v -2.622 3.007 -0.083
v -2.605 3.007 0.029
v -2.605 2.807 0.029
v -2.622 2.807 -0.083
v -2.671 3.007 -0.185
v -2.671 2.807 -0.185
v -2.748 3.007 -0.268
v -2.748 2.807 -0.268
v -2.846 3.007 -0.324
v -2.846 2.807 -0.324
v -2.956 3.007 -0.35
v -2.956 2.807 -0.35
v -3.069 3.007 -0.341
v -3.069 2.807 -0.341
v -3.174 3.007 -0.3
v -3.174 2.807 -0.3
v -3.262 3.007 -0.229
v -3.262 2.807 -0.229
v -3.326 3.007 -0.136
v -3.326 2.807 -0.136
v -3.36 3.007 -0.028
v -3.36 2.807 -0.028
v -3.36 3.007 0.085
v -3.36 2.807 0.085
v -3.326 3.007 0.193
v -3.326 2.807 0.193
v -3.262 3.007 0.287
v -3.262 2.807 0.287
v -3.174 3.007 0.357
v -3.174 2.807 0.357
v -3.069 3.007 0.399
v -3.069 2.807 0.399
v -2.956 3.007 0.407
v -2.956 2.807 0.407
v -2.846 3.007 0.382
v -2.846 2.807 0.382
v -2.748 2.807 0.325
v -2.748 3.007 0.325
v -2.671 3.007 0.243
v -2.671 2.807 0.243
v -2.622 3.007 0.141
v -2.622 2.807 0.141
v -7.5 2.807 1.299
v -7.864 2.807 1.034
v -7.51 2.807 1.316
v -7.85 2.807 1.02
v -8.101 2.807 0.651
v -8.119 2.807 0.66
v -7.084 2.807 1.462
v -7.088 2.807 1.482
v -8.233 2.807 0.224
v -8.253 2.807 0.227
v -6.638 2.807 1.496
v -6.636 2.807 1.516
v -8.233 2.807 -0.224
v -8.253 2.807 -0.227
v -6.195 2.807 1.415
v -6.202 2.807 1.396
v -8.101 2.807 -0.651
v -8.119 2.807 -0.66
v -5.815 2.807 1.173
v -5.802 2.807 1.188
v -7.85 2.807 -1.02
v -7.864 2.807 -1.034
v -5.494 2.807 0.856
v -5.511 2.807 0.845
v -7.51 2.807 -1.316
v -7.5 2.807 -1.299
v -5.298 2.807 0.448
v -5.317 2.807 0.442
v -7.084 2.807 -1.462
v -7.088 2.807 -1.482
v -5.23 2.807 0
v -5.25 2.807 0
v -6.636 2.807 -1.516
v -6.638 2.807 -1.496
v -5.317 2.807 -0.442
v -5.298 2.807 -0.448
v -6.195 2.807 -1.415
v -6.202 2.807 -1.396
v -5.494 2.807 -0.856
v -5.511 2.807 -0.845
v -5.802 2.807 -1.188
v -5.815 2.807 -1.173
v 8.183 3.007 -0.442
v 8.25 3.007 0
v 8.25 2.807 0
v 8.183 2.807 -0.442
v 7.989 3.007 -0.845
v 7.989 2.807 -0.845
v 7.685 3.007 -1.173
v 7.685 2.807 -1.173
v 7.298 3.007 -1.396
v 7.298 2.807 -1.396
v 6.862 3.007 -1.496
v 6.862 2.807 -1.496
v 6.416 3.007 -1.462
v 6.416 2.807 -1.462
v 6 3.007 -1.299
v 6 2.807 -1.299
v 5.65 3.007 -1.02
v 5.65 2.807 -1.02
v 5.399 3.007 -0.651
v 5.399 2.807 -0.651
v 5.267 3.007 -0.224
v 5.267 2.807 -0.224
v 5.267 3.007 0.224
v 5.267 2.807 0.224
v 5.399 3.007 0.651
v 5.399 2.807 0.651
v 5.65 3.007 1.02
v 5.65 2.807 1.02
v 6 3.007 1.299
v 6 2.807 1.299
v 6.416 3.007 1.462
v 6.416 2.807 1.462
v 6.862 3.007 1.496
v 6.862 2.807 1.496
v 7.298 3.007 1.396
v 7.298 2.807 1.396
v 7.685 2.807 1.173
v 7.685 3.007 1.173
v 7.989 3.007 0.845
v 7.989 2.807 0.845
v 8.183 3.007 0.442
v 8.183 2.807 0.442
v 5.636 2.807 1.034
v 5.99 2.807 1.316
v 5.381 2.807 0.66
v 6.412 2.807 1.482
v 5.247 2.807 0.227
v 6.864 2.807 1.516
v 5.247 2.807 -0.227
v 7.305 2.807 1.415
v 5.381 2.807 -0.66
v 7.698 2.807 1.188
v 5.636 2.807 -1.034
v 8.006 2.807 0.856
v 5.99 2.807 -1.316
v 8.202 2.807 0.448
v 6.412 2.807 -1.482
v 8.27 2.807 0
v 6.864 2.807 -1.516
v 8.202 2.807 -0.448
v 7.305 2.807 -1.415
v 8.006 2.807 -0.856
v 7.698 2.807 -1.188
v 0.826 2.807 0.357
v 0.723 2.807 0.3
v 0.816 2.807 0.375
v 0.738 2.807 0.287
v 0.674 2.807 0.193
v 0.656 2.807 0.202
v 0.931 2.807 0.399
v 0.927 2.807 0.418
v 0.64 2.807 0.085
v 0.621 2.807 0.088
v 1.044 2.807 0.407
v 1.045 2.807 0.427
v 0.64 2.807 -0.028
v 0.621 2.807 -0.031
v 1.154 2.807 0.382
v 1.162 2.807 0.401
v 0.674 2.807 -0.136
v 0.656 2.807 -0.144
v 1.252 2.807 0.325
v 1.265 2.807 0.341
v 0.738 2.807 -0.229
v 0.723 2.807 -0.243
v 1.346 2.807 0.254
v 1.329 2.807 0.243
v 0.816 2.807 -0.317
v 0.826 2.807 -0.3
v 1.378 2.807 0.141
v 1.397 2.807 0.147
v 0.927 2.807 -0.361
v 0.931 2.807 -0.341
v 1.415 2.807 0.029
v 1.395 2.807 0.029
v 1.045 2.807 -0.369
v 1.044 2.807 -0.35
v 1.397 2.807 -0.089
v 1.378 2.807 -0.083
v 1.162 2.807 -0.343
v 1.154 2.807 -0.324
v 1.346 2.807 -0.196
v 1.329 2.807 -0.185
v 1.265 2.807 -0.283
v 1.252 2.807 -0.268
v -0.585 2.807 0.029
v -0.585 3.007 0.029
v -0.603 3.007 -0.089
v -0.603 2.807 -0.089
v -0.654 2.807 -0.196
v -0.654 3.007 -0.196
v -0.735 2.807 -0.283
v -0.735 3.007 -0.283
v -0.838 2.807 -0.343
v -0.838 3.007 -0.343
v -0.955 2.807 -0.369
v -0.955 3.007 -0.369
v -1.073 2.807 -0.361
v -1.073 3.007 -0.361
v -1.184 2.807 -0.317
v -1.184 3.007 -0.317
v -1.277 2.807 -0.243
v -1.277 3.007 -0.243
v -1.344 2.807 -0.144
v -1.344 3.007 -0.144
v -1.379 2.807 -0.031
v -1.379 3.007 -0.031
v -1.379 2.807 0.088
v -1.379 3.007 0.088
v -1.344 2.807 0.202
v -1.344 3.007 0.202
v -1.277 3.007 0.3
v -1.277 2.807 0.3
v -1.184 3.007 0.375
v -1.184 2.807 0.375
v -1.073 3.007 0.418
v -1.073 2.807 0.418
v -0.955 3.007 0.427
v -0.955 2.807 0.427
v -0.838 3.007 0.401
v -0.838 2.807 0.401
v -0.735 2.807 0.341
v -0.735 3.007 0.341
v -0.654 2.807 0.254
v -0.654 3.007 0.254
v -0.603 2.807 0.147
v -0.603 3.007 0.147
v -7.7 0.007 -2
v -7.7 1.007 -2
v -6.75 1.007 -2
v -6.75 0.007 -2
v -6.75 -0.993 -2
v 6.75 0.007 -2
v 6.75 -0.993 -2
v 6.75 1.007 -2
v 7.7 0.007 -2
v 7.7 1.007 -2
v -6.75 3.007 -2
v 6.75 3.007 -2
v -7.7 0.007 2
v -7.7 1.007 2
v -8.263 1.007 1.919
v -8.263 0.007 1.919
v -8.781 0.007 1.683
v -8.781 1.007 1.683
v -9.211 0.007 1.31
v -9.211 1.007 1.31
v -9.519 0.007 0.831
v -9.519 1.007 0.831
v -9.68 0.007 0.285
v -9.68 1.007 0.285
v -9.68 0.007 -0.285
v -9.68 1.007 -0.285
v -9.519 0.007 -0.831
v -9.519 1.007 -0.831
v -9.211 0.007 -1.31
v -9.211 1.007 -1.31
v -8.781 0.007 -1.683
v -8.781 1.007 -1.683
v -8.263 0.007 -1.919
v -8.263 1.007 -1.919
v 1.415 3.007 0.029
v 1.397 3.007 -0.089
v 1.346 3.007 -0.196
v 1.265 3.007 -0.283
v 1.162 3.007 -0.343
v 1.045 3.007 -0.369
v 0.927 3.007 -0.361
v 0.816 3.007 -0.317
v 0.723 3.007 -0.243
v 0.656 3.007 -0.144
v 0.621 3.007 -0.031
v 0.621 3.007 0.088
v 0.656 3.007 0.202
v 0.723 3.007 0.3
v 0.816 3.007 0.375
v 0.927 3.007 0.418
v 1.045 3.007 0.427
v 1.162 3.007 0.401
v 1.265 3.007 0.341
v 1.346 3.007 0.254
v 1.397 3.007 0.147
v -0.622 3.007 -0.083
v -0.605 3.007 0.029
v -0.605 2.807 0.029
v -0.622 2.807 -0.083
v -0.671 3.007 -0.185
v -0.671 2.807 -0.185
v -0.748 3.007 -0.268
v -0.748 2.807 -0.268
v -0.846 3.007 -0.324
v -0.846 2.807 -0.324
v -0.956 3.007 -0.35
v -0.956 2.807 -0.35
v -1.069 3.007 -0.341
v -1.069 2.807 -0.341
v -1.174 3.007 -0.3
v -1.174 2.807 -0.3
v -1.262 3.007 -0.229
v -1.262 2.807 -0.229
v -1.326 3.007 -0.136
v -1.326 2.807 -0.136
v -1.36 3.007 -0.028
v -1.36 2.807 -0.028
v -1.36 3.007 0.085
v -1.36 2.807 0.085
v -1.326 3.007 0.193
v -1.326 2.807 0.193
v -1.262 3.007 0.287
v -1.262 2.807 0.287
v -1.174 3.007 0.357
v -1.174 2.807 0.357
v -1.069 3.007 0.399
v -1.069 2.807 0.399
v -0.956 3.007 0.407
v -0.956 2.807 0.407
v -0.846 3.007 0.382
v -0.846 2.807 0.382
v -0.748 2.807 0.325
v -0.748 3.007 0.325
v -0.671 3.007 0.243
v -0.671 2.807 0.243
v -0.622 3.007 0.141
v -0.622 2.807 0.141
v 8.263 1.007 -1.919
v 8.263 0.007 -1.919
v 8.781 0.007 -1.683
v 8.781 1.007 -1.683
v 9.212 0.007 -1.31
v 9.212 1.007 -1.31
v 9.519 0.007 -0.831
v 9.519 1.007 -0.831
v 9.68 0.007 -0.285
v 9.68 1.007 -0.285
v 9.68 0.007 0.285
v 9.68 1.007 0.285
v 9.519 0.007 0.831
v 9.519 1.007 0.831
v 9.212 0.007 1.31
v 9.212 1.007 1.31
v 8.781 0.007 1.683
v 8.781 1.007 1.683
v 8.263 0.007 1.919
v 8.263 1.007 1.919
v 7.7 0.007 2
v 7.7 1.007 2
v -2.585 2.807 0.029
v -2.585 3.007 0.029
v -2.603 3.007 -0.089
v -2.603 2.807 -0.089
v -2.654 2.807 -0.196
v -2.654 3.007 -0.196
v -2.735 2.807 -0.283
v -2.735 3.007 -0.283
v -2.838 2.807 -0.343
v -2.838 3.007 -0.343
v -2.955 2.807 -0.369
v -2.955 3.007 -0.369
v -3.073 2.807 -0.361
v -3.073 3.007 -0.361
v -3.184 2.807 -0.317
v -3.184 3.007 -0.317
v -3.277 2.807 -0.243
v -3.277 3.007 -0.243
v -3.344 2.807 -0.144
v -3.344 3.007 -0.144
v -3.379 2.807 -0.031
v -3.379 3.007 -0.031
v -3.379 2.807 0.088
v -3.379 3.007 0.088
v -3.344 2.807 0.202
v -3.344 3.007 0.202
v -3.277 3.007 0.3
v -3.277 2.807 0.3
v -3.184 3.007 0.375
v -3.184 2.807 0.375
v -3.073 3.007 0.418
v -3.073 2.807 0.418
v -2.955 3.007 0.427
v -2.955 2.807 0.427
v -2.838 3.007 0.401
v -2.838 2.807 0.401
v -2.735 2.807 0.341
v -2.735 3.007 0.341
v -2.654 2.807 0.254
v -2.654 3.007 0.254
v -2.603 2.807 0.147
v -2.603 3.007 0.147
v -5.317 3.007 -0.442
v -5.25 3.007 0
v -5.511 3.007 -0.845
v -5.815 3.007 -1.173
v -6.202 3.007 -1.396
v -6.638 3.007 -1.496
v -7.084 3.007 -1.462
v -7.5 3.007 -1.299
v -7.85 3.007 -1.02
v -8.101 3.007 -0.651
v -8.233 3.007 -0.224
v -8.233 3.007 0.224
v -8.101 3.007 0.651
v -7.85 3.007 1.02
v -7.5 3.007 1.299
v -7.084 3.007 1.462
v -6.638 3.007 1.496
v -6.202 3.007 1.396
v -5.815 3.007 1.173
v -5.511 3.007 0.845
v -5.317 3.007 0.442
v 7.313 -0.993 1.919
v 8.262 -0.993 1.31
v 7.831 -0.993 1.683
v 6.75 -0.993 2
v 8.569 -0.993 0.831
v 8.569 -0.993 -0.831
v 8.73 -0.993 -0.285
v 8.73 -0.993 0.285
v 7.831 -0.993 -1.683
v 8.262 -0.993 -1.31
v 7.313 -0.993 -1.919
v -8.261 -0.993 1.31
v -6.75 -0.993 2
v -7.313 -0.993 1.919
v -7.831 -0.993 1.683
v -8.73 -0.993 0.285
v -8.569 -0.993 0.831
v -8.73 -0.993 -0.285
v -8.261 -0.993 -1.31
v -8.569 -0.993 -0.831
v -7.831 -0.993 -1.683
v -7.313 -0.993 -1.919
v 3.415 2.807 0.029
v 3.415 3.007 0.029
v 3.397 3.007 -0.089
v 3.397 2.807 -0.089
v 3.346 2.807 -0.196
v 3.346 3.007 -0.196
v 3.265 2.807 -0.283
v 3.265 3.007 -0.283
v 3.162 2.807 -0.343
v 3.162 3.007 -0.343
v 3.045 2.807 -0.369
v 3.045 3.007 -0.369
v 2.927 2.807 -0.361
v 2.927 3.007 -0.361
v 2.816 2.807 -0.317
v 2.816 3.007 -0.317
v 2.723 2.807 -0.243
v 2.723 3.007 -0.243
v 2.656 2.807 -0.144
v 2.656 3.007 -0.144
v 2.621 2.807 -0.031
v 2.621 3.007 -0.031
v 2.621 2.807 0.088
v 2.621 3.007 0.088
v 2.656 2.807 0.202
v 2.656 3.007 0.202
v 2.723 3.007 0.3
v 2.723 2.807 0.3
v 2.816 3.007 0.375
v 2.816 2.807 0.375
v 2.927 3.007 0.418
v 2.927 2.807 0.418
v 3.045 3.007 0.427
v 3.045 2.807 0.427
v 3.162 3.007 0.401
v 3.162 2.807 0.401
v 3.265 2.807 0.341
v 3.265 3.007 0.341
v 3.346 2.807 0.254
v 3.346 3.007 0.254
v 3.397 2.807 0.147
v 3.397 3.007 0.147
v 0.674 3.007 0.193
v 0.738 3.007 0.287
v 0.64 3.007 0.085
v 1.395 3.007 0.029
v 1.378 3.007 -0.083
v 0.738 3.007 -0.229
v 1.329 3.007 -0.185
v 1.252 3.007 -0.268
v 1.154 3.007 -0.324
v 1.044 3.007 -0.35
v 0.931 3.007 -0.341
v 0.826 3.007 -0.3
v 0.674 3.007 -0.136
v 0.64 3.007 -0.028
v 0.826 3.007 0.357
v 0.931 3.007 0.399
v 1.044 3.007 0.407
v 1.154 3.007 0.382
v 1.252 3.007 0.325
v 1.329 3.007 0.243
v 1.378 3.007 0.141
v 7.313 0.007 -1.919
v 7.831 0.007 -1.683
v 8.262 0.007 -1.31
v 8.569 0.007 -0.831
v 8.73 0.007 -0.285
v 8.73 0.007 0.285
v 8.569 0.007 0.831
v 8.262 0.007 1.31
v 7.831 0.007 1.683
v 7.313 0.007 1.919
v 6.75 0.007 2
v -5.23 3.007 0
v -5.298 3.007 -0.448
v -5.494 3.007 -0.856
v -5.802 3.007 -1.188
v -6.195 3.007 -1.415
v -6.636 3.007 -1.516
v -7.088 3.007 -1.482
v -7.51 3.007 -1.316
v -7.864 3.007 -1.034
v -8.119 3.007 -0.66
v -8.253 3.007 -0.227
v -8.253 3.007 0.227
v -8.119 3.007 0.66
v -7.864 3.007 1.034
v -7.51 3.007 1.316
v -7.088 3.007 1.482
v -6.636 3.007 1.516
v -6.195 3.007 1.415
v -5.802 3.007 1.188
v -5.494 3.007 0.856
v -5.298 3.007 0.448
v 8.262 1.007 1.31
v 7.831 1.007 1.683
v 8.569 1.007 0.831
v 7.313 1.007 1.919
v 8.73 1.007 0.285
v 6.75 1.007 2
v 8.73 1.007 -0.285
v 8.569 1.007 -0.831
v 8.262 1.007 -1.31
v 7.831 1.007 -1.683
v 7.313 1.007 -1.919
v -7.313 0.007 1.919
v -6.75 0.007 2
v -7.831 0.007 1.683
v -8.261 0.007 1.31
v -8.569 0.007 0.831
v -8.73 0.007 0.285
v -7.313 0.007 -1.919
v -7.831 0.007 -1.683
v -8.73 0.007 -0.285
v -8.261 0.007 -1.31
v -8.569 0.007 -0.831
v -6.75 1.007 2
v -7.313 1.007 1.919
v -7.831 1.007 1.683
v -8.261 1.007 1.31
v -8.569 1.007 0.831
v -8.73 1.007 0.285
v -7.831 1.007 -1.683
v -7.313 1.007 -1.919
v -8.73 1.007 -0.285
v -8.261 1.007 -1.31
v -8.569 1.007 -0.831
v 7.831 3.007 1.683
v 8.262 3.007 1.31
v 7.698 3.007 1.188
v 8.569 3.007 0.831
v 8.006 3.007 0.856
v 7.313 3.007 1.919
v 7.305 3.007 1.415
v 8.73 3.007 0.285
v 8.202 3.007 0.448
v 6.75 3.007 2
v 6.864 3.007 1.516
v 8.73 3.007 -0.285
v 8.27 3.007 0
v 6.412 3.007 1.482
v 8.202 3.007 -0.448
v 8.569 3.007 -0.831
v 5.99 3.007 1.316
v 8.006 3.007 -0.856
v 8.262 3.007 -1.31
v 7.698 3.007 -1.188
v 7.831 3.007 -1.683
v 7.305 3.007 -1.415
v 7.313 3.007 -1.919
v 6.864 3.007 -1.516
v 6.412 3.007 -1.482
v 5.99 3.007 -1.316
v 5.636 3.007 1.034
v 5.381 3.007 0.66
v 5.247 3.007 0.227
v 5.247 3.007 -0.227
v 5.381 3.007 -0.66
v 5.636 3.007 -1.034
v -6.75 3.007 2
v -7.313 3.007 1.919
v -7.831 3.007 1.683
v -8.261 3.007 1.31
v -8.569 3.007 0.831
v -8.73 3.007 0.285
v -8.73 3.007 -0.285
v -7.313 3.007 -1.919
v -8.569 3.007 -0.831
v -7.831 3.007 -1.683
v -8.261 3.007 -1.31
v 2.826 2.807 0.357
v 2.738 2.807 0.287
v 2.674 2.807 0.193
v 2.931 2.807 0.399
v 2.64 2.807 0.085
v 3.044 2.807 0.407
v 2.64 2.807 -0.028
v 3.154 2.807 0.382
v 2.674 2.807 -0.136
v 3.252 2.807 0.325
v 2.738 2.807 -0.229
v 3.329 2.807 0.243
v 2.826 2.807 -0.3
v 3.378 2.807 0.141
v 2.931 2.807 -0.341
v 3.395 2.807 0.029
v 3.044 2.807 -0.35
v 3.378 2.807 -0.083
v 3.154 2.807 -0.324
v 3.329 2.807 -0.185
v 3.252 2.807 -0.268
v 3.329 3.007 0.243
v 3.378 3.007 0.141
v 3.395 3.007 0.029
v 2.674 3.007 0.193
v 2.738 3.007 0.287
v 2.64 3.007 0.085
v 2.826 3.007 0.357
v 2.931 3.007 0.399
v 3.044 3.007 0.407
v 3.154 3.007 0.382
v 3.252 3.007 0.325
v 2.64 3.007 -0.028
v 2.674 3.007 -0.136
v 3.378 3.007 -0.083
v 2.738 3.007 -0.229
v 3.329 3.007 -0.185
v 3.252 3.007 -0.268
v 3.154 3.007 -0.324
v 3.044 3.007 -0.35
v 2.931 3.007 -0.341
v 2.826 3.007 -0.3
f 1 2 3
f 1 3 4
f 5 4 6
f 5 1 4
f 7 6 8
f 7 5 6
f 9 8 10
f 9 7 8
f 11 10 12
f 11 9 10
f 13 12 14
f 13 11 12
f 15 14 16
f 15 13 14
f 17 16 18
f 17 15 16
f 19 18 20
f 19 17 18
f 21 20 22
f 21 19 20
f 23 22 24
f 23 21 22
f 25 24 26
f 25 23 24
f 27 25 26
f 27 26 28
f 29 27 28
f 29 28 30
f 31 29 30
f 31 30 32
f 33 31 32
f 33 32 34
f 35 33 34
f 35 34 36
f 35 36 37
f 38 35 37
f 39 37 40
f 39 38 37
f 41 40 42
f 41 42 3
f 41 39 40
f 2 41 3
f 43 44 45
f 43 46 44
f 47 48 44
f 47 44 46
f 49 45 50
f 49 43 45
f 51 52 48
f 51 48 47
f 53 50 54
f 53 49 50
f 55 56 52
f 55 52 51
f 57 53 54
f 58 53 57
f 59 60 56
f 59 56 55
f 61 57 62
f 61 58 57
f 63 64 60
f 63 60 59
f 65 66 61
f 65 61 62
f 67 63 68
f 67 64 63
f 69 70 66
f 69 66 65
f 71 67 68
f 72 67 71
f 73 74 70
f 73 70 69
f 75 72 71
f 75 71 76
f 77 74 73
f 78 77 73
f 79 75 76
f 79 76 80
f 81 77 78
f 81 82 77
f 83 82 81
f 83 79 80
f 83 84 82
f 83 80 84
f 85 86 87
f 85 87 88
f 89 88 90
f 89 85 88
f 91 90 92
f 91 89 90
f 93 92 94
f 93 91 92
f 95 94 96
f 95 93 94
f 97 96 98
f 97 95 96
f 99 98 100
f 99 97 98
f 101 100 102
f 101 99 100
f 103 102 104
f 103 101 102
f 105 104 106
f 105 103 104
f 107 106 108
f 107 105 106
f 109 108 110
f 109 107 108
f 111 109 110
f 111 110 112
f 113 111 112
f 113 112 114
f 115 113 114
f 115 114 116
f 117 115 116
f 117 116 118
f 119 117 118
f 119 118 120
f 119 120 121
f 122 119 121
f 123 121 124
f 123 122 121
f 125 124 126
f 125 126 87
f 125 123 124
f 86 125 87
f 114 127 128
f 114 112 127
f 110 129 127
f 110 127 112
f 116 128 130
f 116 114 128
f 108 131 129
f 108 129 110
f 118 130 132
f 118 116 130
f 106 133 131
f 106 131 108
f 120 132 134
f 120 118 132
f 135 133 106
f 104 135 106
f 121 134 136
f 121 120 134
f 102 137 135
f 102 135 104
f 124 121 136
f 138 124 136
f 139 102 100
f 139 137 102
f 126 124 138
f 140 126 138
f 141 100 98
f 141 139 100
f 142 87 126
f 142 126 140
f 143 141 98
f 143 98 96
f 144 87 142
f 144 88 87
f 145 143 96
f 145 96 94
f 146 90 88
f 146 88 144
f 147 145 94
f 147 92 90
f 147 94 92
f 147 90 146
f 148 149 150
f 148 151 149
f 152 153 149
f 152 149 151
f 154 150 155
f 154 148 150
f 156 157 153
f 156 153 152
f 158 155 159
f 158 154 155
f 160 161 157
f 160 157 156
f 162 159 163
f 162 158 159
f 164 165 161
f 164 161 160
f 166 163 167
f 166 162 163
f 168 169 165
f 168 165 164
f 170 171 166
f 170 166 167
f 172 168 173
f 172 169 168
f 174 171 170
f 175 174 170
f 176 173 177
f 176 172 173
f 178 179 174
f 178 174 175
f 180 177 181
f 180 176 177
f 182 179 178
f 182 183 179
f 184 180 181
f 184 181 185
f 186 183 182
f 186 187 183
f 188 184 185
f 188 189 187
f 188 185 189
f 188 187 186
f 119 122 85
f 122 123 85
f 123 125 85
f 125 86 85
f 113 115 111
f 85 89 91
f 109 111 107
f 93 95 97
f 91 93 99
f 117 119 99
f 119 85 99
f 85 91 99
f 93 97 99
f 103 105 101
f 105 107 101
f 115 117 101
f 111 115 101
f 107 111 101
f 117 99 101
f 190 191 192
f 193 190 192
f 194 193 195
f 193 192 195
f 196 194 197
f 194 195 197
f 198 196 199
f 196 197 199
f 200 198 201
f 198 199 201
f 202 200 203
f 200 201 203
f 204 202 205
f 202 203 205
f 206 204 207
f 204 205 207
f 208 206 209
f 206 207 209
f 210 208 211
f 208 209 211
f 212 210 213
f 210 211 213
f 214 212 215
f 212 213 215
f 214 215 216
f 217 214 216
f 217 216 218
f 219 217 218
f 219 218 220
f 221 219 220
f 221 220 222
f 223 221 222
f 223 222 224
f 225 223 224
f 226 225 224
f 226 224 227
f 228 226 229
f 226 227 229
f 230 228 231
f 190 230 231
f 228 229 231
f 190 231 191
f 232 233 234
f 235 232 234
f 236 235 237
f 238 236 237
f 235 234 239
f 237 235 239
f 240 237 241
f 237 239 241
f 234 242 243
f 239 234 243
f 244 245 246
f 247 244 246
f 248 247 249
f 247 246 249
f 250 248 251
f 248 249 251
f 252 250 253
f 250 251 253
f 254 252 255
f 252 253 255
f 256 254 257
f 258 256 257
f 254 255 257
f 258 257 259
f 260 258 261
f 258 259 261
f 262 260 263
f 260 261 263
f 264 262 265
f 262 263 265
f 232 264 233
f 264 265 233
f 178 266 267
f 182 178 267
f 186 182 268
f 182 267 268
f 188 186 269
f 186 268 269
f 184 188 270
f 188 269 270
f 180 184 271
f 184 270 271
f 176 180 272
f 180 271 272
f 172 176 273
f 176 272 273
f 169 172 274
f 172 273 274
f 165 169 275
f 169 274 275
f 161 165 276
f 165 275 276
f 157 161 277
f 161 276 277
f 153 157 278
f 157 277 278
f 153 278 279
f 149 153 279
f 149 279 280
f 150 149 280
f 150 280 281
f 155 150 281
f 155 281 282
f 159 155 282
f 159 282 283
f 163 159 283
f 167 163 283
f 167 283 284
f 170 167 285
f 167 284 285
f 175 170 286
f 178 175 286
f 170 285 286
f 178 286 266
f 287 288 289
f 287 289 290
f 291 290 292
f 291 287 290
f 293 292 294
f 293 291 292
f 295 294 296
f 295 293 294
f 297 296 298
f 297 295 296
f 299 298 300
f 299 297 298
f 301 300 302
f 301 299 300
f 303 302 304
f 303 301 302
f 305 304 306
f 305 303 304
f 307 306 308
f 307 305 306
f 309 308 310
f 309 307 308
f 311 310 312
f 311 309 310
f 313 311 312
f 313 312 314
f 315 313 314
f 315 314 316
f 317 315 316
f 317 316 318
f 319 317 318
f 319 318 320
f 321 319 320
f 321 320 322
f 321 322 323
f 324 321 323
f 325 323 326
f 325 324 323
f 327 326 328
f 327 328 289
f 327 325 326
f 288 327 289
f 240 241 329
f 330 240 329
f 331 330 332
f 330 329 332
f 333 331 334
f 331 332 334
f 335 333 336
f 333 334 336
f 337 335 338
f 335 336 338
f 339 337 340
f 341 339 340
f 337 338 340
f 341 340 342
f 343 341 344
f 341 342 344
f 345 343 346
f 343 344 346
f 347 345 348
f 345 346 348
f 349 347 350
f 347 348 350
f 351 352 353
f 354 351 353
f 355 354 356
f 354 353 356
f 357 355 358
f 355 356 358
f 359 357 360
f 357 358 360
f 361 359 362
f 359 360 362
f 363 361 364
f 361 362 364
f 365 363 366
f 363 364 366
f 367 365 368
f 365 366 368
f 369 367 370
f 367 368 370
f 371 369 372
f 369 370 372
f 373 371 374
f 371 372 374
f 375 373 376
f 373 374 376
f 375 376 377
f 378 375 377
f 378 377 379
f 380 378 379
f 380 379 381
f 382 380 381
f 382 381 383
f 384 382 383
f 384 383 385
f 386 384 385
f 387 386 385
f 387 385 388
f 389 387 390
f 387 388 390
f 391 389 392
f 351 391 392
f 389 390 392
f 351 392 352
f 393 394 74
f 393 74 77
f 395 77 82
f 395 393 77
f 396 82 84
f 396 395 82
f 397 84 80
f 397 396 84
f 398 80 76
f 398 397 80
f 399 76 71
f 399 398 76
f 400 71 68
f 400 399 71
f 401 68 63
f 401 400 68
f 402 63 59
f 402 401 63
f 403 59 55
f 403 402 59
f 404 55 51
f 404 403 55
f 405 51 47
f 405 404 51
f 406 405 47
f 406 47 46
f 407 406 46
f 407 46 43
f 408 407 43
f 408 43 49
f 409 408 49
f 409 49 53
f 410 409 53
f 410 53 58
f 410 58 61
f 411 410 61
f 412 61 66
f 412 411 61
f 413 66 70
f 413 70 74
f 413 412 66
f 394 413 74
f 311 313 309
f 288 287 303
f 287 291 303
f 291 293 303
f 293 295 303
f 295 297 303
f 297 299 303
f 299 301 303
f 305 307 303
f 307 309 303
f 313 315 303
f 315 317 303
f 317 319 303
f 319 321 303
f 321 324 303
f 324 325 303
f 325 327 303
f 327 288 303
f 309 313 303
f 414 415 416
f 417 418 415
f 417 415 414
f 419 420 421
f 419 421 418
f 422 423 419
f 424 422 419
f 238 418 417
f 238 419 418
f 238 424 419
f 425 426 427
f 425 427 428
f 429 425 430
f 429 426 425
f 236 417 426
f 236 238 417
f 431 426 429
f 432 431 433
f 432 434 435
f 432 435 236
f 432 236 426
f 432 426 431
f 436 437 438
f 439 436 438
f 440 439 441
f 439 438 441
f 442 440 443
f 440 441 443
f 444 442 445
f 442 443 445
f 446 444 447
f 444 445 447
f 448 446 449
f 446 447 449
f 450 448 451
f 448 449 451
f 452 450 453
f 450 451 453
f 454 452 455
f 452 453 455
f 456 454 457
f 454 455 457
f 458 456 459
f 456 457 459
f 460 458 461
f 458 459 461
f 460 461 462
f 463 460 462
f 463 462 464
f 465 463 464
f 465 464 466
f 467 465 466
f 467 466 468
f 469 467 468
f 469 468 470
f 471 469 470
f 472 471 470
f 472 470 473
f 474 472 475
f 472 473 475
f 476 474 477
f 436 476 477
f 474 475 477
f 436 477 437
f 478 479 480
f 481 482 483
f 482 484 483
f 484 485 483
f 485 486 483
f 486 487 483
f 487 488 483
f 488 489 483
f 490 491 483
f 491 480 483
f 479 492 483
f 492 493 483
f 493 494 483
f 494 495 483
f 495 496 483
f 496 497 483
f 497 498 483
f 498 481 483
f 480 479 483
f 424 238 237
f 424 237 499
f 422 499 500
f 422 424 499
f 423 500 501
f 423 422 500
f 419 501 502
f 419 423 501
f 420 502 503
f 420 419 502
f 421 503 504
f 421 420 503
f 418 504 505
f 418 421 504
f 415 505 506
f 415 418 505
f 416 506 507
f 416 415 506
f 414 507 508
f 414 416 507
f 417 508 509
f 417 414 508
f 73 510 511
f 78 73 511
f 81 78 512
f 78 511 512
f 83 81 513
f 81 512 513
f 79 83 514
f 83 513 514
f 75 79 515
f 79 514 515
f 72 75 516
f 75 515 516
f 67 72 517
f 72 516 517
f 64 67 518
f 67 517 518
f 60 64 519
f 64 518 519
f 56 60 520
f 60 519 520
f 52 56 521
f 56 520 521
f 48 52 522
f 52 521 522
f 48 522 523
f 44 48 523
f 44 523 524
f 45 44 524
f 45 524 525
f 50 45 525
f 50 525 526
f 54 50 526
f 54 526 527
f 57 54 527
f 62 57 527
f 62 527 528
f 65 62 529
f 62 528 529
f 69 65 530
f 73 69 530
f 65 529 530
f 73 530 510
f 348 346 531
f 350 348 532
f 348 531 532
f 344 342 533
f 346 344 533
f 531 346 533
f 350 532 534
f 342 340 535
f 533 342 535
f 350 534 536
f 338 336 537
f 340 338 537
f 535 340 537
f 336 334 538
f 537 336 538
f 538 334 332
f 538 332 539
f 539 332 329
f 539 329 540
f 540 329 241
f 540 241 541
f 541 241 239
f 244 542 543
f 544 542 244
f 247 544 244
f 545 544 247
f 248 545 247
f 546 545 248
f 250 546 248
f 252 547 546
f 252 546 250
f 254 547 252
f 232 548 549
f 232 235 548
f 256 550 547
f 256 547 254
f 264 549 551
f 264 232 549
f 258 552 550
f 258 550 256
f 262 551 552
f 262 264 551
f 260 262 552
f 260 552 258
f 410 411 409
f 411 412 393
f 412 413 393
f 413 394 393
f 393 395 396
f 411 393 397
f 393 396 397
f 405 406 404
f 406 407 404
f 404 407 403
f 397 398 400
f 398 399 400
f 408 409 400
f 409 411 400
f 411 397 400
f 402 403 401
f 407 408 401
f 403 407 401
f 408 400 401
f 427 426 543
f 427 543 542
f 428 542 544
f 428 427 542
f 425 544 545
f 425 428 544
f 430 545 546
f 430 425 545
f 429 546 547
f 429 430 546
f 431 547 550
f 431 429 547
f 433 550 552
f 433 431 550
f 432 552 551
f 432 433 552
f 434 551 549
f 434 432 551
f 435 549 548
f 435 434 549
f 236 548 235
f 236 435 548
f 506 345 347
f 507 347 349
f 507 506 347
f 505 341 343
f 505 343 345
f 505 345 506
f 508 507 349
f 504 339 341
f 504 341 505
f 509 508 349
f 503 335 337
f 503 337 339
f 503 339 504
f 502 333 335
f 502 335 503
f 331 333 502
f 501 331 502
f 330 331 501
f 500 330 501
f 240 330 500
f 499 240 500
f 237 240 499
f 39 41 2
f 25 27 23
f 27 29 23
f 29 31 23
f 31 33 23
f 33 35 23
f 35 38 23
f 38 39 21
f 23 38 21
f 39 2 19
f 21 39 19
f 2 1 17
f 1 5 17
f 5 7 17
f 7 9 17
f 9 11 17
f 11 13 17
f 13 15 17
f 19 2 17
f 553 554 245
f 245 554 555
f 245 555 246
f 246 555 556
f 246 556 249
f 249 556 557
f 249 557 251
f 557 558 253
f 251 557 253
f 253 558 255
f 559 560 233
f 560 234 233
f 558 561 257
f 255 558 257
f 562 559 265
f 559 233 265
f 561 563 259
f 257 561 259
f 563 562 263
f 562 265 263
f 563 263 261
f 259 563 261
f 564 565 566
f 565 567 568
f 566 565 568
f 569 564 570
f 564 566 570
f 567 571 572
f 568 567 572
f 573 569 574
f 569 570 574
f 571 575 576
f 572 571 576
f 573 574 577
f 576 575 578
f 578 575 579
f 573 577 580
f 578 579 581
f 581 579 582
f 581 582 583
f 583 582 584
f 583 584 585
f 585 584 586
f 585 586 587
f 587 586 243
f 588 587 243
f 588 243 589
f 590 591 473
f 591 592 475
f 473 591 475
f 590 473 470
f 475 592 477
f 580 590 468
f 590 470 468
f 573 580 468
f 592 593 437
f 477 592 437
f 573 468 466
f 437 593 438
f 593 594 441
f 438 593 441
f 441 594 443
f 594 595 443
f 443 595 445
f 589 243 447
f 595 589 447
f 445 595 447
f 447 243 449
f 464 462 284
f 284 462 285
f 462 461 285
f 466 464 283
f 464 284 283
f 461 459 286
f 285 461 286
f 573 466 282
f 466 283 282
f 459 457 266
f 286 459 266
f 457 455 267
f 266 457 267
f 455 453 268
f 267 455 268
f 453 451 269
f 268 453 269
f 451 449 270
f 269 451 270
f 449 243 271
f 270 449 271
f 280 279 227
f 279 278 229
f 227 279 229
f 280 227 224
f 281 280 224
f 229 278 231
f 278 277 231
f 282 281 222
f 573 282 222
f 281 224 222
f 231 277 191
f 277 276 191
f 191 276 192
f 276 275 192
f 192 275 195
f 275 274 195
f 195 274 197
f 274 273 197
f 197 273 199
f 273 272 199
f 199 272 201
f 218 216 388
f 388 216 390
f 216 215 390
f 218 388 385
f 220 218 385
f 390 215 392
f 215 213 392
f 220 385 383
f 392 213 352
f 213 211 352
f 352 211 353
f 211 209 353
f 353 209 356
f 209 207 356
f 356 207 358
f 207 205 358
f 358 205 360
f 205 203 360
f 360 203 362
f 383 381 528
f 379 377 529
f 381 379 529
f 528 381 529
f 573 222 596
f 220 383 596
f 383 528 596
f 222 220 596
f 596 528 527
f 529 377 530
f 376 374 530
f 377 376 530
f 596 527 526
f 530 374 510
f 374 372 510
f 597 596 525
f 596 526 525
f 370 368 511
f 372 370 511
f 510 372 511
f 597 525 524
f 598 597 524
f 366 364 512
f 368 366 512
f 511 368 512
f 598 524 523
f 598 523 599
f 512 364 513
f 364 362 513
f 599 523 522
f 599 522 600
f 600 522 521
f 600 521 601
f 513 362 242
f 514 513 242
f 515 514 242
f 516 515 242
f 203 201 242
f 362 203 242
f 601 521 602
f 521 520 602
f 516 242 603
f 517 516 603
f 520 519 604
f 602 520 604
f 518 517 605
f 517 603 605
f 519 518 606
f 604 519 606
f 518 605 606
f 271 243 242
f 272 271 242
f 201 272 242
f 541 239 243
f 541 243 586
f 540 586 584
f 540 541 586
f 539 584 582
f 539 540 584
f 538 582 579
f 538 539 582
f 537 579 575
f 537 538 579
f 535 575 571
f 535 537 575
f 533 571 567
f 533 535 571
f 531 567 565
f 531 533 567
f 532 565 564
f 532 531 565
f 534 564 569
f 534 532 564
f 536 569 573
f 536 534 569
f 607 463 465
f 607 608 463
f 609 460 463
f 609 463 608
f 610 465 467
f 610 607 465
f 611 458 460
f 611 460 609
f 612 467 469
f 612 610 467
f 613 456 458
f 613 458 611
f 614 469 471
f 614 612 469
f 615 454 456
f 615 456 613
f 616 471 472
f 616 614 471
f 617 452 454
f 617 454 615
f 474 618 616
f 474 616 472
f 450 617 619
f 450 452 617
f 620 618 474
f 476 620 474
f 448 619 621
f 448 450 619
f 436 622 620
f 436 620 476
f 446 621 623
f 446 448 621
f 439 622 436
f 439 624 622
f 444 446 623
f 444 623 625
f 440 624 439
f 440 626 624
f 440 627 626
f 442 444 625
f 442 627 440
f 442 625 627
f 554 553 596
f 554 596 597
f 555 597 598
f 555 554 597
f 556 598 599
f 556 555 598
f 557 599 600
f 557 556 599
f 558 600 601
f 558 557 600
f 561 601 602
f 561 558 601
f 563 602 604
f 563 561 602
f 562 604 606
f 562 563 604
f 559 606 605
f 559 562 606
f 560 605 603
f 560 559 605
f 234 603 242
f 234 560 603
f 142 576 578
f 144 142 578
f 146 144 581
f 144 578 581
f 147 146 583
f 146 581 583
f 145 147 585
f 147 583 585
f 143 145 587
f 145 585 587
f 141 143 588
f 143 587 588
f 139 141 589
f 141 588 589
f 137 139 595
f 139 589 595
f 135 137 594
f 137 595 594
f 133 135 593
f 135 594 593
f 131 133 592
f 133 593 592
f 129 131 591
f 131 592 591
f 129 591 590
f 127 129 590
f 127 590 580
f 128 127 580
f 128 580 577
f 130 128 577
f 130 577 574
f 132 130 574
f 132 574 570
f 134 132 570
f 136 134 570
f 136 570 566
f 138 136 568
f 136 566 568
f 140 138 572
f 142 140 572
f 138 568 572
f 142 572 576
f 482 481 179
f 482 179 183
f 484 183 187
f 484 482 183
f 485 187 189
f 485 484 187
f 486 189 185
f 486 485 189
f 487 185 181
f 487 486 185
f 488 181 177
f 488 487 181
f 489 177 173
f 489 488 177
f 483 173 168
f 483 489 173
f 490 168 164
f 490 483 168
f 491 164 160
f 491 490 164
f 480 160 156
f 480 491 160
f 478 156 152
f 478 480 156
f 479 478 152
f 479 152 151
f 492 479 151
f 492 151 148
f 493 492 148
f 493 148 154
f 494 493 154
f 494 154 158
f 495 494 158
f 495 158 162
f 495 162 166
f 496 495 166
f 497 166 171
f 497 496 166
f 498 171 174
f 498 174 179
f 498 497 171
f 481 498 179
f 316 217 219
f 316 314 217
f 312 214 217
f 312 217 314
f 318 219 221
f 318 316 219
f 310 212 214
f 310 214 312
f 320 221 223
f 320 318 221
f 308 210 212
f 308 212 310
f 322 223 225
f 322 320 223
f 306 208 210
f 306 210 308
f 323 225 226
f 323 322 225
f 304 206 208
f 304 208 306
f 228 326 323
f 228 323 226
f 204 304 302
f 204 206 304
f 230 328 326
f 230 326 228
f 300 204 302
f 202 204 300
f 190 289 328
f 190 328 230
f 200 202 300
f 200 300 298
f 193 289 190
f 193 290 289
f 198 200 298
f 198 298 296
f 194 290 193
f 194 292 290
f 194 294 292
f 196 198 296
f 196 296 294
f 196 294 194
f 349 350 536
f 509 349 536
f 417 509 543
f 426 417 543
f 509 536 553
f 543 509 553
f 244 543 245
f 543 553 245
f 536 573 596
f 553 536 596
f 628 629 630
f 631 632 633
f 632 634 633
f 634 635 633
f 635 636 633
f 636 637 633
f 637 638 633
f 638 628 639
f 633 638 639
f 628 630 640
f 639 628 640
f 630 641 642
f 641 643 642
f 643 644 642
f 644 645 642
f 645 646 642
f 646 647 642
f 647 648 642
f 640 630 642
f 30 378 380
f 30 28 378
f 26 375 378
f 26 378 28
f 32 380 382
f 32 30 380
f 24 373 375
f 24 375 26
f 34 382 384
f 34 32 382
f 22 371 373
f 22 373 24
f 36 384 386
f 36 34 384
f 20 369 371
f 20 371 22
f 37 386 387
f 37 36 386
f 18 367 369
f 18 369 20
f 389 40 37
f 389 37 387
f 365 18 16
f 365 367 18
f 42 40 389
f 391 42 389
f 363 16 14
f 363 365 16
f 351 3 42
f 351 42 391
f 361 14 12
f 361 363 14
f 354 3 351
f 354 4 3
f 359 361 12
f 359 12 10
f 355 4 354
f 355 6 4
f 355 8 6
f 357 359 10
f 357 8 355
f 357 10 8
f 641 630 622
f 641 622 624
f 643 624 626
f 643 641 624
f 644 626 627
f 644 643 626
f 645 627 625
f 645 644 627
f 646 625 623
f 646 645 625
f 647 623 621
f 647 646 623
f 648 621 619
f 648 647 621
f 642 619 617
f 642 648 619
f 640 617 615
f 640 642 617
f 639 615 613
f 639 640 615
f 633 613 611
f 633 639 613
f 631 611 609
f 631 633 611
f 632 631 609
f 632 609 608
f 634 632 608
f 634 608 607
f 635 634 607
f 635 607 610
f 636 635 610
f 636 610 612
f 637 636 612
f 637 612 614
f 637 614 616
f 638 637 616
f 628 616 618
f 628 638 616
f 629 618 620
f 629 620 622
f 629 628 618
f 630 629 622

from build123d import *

# Parameters (mm, degrees)
BOSS_EXTRUDE1_DEPTH = 2
BOSS_EXTRUDE2_START = -1
BOSS_EXTRUDE2_DEPTH = 0.5
SKETCH3_R           = 0.76
SKETCH3_R_2         = 0.75
SKETCH3_R_3         = 0.199685651
SKETCH3_R_4         = 0.189685651
CUT_EXTRUDE1_DEPTH  = 0.1
SCALE1_SCALE        = 2


with BuildPart() as part:
    # Sketch1 → Boss-Extrude1 (new body)
    with BuildSketch(Plane(origin=(0, 0, 0), x_dir=(1, 0, 0), z_dir=(0, 1, 0))):
        with BuildLine():
            Line((-3.375, 1), (3.375, 1))
            ThreePointArc((3.375, 1), (4.375, 0), (3.375, -1))
            Line((3.375, -1), (-3.375, -1))
            ThreePointArc((-3.375, -1), (-4.375, 0), (-3.375, 1))
        make_face()
    extrude(amount=BOSS_EXTRUDE1_DEPTH)

    # Sketch2 → Boss-Extrude2 (add)
    with BuildSketch(Plane(origin=(0, 2, 0), x_dir=(1, 0, 0), z_dir=(0, 1, 0)).offset(BOSS_EXTRUDE2_START)):
        with BuildLine():
            Line((-3.85, 1), (3.85, 1))
            ThreePointArc((3.85, 1), (4.85, 0), (3.85, -1))
            Line((3.85, -1), (-3.85, -1))
            ThreePointArc((-3.85, -1), (-4.85, 0), (-3.85, 1))
        make_face()
    extrude(amount=-BOSS_EXTRUDE2_DEPTH)

    # Sketch3 → Cut-Extrude1 (cut)
    with BuildSketch(Plane(origin=(0, 2, 0), x_dir=(1, 0, 0), z_dir=(0, 1, 0))):
        with Locations((-3.375, 0)):
            Circle(SKETCH3_R)
        with Locations((-3.375, 0)):
            Circle(SKETCH3_R_2, mode=Mode.SUBTRACT)
        with Locations((-1.492185541, -0.014395915)):
            Circle(SKETCH3_R_3)
        with Locations((-1.492185541, -0.014395915)):
            Circle(SKETCH3_R_4, mode=Mode.SUBTRACT)
        with Locations((-0.492185541, -0.014395915)):
            Circle(SKETCH3_R_3)
        with Locations((-0.492185541, -0.014395915)):
            Circle(SKETCH3_R_4, mode=Mode.SUBTRACT)
        with Locations((0.507814459, -0.014395915)):
            Circle(SKETCH3_R_3)
        with Locations((0.507814459, -0.014395915)):
            Circle(SKETCH3_R_4, mode=Mode.SUBTRACT)
        with Locations((1.507814459, -0.014395915)):
            Circle(SKETCH3_R_3)
        with Locations((1.507814459, -0.014395915)):
            Circle(SKETCH3_R_4, mode=Mode.SUBTRACT)
        with Locations((3.375, 0)):
            Circle(SKETCH3_R)
        with Locations((3.375, 0)):
            Circle(SKETCH3_R_2, mode=Mode.SUBTRACT)
    extrude(amount=-CUT_EXTRUDE1_DEPTH, mode=Mode.SUBTRACT)


with BuildPart() as part_1:
    # Scale1: scaled about (-1.117e-06, 0.99266013, -2.058e-06)
    add(part.part.scale(SCALE1_SCALE).moved(Location((1.117e-06, -0.99266013, 2.058e-06))))


solid = part_1.part
